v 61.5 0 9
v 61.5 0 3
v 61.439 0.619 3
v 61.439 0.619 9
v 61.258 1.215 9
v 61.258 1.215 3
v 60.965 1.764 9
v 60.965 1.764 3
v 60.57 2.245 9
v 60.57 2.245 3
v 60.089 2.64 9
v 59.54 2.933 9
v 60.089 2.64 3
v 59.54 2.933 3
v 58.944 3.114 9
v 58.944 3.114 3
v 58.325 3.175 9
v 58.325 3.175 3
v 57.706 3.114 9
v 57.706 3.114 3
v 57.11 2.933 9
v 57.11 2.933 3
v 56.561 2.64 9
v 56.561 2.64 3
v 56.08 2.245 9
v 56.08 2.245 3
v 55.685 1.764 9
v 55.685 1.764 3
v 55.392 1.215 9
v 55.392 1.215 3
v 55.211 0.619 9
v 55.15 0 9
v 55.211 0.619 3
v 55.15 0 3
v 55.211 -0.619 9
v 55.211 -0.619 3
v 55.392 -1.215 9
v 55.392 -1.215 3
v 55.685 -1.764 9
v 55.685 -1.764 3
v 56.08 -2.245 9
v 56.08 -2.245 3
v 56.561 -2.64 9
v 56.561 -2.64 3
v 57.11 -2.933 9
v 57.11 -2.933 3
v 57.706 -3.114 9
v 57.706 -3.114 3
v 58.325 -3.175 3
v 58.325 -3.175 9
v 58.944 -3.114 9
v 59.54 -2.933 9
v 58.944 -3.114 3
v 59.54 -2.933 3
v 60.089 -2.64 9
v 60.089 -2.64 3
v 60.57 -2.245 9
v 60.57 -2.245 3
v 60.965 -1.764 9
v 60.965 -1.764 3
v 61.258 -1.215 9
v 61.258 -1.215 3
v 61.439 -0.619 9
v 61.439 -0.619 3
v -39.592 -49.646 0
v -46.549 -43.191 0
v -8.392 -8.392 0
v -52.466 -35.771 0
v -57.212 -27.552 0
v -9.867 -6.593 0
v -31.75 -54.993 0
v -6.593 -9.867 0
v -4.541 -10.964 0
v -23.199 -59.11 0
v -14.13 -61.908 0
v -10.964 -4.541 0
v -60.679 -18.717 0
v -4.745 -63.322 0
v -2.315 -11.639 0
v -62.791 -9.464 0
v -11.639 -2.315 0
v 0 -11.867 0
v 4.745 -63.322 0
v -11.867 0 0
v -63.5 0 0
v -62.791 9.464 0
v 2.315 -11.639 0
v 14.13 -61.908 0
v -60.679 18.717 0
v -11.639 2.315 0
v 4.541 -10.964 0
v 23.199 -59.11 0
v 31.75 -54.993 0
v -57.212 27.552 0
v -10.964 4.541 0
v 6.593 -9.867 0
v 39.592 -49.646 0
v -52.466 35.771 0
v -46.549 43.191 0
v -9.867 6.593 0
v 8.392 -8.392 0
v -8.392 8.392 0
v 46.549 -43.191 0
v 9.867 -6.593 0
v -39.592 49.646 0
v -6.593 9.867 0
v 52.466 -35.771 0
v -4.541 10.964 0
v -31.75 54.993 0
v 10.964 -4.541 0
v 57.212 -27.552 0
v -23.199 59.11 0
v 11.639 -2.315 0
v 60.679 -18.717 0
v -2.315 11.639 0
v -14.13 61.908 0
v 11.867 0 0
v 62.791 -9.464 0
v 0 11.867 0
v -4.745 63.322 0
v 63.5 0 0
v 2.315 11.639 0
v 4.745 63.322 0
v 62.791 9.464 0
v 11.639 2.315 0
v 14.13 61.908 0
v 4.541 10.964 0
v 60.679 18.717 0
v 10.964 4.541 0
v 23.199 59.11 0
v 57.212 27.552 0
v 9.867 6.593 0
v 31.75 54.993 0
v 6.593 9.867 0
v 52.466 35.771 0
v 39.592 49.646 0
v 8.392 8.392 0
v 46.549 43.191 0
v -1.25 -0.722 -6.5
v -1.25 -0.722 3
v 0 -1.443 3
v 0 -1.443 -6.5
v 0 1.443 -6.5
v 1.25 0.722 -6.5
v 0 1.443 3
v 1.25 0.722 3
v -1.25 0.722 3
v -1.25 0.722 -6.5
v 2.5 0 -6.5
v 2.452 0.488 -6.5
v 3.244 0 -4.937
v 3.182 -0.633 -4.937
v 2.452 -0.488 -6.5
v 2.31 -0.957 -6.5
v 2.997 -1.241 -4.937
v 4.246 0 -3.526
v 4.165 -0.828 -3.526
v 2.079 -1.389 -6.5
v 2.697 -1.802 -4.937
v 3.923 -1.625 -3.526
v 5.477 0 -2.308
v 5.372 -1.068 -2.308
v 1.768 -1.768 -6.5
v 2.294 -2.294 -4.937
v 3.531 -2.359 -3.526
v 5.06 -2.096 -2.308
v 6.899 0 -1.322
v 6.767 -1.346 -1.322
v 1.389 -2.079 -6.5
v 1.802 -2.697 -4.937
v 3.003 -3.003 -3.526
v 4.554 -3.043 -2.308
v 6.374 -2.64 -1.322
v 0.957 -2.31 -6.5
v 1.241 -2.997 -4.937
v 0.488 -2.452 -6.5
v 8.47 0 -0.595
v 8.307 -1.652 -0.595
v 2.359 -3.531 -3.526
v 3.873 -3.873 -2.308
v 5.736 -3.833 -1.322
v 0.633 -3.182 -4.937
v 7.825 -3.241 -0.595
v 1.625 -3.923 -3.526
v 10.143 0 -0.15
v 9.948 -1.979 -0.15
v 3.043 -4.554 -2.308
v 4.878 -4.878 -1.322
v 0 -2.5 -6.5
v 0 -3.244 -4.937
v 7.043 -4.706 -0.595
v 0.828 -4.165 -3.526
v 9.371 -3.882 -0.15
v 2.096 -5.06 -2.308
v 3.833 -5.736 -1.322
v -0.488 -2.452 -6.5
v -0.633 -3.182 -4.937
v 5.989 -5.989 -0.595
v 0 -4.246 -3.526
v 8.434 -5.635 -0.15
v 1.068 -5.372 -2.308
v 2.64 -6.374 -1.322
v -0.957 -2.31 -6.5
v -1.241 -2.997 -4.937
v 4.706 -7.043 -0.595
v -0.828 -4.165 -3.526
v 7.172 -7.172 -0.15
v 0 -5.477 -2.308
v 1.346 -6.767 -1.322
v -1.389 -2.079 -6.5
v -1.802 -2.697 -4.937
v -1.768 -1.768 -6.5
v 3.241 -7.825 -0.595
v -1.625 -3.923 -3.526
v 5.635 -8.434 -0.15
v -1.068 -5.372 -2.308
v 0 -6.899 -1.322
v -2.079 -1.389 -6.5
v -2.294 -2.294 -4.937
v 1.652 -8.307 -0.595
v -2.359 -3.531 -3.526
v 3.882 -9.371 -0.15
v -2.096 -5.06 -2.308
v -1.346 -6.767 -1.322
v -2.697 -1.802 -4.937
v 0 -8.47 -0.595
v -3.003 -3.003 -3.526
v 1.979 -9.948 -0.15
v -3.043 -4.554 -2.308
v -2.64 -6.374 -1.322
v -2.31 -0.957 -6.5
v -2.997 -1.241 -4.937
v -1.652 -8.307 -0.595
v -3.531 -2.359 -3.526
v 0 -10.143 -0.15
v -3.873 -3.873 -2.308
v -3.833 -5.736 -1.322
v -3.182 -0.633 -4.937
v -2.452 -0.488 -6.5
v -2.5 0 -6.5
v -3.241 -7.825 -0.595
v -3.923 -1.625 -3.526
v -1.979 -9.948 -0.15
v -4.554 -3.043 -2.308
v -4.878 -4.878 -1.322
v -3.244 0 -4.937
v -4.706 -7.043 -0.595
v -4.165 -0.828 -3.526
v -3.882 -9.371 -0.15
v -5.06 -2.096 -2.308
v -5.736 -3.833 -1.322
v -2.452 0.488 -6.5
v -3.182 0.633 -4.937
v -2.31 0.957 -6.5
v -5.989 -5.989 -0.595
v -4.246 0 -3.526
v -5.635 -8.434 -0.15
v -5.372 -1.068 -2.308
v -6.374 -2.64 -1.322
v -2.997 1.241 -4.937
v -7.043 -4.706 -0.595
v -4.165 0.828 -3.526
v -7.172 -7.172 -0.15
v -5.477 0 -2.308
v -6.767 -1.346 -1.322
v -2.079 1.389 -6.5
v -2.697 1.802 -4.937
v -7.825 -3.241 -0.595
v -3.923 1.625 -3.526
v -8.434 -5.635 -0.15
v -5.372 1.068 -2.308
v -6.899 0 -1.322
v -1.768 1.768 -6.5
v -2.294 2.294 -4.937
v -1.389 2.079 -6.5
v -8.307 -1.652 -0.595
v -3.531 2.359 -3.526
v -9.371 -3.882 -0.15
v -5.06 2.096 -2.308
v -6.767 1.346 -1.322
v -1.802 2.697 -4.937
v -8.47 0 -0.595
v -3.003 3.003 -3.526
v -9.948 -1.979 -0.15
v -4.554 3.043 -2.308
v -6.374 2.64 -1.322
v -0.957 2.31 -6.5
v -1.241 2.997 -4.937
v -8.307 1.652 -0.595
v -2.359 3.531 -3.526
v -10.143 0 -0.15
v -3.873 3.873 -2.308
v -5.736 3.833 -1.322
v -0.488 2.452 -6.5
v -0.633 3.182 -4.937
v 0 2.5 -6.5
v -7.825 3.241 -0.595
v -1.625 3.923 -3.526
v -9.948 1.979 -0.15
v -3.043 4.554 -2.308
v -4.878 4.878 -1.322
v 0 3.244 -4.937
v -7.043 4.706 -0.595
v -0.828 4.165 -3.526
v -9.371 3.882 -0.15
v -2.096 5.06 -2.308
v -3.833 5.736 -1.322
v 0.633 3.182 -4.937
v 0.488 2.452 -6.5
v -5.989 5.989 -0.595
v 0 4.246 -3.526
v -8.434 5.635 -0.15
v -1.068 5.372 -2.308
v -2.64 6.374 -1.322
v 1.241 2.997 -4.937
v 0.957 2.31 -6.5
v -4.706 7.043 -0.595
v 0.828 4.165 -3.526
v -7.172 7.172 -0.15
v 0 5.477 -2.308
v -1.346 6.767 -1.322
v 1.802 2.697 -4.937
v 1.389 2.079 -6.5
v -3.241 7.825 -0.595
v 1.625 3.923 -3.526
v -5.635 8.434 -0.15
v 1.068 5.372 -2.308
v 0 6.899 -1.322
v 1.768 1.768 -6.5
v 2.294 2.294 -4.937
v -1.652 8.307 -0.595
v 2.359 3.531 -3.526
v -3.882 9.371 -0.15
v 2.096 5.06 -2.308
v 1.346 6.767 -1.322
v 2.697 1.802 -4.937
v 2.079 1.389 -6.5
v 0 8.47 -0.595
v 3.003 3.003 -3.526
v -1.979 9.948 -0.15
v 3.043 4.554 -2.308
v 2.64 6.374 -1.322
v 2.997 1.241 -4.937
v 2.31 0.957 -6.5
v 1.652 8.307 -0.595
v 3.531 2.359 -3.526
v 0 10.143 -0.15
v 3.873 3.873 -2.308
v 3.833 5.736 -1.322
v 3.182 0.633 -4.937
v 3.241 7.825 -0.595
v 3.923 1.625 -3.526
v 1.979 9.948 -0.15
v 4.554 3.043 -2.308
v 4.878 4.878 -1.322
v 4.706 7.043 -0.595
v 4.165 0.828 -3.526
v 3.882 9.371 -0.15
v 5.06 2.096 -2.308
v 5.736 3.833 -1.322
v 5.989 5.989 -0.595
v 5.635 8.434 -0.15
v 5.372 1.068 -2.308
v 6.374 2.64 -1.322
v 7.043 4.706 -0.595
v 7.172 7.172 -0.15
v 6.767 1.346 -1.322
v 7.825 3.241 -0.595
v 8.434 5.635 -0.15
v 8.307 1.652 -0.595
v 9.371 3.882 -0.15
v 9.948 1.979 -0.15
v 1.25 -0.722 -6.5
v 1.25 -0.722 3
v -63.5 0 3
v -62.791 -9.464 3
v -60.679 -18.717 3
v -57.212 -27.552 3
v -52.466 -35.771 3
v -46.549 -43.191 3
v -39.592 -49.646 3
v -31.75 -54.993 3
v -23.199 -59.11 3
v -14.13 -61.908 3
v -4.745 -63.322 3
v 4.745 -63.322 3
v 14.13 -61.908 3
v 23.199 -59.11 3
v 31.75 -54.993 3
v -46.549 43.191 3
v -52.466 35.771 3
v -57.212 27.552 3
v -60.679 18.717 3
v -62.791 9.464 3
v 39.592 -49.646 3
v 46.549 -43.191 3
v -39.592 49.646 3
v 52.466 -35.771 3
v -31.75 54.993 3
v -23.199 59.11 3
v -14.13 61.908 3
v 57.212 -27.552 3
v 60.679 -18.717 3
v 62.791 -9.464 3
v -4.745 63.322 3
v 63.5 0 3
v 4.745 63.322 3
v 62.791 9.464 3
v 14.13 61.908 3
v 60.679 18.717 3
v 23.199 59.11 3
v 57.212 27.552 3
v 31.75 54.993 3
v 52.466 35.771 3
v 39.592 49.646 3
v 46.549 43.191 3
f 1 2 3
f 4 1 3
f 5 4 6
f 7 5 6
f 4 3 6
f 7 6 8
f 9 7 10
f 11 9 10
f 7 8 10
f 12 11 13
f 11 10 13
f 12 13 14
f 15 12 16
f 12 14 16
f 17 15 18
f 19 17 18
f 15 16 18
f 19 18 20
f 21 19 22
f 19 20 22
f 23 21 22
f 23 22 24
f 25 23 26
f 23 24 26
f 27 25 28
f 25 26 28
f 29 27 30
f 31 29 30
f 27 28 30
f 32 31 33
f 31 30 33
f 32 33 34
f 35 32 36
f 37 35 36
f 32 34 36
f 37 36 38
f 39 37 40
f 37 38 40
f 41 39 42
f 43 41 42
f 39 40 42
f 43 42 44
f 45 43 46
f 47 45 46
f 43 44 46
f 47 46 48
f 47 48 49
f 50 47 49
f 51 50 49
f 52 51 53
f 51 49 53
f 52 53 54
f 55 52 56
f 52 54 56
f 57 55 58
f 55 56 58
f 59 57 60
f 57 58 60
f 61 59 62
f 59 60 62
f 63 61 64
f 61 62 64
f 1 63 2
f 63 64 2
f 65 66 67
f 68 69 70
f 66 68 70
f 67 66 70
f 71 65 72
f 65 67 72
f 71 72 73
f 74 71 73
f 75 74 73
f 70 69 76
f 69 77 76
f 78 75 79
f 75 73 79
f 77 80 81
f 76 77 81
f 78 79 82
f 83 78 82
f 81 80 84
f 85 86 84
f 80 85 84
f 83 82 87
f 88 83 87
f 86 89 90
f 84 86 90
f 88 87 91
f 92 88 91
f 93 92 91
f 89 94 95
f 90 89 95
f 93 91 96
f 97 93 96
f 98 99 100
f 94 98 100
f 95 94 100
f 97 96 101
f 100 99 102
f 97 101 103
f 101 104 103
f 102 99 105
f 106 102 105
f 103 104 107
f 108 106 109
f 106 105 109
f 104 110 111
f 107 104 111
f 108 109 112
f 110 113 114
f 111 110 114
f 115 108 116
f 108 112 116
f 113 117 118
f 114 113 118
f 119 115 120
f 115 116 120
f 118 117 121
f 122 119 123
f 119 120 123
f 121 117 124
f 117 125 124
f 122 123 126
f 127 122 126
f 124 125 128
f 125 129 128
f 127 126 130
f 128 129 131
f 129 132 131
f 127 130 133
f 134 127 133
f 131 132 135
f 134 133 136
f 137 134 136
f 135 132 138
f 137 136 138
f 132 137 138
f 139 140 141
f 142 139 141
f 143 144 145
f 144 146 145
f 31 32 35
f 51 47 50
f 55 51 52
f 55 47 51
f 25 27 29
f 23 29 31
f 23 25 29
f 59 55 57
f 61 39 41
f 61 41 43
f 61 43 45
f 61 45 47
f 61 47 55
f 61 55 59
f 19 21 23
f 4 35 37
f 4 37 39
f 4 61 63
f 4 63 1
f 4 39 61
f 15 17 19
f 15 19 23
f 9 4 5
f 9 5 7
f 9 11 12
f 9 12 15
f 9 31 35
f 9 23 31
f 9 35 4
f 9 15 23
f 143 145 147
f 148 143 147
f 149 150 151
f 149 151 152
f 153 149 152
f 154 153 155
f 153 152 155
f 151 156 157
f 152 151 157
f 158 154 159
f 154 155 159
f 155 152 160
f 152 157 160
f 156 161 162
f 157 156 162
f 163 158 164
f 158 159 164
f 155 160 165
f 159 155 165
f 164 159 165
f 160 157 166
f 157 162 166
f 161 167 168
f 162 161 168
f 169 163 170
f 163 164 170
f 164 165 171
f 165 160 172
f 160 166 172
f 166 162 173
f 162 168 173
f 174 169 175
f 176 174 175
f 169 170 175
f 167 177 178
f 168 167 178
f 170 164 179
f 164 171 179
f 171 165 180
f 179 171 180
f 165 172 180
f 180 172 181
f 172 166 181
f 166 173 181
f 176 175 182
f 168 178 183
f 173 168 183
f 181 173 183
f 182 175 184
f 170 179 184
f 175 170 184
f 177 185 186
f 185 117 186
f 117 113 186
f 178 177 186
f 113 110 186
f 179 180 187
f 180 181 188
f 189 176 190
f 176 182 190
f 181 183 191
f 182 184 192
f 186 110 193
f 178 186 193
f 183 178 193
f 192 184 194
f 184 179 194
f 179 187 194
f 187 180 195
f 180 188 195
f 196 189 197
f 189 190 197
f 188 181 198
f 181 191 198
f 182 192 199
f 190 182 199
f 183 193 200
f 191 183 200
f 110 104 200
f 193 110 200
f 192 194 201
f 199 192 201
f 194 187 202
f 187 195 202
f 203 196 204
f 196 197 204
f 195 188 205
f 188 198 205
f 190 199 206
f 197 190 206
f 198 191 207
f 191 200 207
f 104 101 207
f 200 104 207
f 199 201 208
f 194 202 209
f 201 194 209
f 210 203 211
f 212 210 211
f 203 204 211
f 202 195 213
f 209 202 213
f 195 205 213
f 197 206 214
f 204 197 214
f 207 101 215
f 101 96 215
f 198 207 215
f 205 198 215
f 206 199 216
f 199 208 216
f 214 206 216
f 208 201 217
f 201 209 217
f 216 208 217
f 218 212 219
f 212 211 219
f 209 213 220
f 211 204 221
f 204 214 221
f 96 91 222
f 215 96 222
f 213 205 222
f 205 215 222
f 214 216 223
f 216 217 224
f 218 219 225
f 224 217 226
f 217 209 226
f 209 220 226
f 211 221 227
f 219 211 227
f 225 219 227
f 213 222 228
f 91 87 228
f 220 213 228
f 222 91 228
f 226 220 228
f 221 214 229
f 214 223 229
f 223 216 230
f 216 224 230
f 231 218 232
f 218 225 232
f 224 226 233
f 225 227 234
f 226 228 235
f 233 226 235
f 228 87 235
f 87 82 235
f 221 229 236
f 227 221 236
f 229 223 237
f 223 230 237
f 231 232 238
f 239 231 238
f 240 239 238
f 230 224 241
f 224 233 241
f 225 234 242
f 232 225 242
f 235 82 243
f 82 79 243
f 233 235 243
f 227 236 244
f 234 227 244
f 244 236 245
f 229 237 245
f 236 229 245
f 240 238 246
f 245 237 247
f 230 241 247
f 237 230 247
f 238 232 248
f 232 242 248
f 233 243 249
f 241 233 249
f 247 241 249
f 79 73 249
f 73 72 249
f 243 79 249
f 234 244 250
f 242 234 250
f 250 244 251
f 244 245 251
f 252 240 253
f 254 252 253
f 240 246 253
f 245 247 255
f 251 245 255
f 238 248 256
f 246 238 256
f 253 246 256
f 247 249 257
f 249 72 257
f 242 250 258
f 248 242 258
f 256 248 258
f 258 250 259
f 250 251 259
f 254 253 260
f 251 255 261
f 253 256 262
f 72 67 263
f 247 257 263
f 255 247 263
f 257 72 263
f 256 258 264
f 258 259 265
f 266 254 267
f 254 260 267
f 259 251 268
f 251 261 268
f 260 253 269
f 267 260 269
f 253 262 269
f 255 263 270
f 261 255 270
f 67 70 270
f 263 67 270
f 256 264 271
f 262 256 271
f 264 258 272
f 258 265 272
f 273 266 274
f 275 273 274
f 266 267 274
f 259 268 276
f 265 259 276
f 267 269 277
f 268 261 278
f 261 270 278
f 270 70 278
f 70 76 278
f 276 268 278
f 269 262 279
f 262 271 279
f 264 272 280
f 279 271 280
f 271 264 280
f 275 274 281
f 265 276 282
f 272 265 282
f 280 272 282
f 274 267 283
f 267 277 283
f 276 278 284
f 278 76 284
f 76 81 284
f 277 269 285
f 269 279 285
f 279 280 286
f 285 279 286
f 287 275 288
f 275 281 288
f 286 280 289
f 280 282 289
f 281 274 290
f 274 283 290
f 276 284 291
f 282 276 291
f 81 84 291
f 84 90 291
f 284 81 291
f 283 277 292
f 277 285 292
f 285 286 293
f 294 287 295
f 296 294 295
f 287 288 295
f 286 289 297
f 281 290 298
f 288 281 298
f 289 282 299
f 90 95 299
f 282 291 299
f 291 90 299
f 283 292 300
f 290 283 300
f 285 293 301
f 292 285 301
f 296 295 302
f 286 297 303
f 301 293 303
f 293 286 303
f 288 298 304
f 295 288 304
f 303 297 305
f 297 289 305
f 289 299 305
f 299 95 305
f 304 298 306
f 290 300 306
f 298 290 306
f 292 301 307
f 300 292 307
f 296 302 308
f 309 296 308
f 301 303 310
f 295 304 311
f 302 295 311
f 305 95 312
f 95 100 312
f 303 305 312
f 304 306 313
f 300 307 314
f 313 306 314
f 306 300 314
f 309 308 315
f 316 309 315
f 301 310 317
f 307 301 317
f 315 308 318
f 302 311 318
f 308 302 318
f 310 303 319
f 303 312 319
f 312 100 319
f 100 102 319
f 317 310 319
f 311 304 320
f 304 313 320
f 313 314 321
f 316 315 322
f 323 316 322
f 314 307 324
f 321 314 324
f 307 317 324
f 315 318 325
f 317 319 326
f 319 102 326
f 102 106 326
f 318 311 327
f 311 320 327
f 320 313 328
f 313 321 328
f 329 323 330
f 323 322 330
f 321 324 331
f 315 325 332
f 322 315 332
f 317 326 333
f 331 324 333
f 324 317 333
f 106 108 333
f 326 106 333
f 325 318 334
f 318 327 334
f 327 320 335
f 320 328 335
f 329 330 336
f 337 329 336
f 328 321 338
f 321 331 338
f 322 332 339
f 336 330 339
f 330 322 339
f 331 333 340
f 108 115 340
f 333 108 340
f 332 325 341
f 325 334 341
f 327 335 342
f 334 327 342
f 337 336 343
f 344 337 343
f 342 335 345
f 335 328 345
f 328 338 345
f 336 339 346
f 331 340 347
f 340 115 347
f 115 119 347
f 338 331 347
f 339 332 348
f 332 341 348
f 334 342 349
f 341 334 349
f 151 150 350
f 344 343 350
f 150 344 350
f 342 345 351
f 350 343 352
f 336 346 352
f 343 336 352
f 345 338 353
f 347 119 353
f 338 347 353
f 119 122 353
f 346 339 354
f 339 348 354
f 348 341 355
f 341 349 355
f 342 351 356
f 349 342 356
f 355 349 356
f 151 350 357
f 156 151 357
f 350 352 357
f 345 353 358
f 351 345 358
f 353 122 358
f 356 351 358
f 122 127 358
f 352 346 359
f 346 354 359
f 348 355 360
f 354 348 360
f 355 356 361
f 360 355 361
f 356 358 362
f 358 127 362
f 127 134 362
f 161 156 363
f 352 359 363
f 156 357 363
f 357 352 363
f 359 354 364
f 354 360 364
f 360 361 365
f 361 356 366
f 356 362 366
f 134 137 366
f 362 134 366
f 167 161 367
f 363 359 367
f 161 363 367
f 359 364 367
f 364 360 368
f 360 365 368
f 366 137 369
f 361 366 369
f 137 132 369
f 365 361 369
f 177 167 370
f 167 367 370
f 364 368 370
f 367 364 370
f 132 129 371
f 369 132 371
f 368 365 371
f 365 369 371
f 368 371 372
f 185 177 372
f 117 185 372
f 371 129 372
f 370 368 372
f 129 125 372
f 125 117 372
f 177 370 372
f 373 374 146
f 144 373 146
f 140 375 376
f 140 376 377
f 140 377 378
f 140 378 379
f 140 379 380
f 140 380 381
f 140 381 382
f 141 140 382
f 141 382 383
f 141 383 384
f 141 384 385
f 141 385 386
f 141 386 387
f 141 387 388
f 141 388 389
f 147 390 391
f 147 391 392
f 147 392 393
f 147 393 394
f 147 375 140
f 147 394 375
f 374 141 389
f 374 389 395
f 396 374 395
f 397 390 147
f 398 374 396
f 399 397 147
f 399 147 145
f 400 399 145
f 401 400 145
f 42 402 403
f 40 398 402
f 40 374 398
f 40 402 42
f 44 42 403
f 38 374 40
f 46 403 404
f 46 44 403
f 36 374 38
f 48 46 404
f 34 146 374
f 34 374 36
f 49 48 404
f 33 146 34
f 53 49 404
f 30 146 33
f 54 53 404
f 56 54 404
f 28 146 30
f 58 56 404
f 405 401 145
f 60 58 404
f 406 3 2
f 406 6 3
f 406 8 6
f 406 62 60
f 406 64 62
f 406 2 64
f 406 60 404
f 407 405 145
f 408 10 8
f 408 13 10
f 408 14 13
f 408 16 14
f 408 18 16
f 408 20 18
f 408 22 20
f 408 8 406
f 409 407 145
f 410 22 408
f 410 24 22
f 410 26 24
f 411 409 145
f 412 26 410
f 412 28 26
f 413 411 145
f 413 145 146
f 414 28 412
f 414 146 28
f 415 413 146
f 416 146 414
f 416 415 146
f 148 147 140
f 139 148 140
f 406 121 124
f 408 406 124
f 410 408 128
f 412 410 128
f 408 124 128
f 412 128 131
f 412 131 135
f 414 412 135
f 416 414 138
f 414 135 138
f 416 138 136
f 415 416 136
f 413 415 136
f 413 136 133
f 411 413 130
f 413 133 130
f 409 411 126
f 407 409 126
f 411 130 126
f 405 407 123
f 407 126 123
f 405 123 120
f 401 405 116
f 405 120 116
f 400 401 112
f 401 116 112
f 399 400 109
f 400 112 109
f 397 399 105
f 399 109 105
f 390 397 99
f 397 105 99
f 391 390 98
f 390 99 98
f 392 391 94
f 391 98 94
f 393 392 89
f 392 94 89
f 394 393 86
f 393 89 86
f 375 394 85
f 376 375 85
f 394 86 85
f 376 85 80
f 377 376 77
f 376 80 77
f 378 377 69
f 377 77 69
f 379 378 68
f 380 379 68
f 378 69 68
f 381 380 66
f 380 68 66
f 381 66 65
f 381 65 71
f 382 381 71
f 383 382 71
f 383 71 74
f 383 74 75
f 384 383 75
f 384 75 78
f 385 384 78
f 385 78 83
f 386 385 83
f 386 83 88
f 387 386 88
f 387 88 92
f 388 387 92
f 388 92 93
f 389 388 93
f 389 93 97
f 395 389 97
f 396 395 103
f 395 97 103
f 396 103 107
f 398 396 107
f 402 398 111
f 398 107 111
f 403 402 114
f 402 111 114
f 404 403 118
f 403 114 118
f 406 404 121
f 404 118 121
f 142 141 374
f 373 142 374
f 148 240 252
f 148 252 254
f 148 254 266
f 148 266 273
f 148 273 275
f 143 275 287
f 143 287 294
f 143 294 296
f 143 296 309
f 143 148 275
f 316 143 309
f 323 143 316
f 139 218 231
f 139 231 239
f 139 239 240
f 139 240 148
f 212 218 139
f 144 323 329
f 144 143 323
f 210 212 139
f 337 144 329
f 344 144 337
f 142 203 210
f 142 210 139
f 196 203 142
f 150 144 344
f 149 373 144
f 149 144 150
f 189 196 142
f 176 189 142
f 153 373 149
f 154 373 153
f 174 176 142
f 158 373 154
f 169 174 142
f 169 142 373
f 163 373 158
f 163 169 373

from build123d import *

# Parameters (mm, degrees)
SKETCH1_R           = 63.5
BOSS_EXTRUDE1_DEPTH = 3
SKETCH3_R           = 3.175
BOSS_EXTRUDE2_DEPTH = 6
CUT_EXTRUDE1_DEPTH  = 6
SKETCH5_R           = 2.5
BOSS_EXTRUDE3_DEPTH = 6.5
FILLET1_R           = 10


with BuildPart() as part:
    # Sketch1 → Boss-Extrude1 (new body)
    with BuildSketch(Plane.XY):
        Circle(SKETCH1_R)
    extrude(amount=BOSS_EXTRUDE1_DEPTH)

    # Sketch3 → Boss-Extrude2 (add)
    with BuildSketch(Plane.XY.offset(3)):
        with Locations((58.325, 0)):
            Circle(SKETCH3_R)
    extrude(amount=BOSS_EXTRUDE2_DEPTH)

    # Sketch4 → Cut-Extrude1 (cut)
    with BuildSketch(Plane.XY.offset(3)):
        Polygon((0, 1.443375673), (-1.25, 0.721687836), (-1.25, -0.721687836), (0, -1.443375673), (1.25, -0.721687836), (1.25, 0.721687836), align=None)
    extrude(amount=-CUT_EXTRUDE1_DEPTH, mode=Mode.SUBTRACT)

    # Sketch5 → Boss-Extrude3 (add)
    with BuildSketch(Plane(origin=(0, 0, 0), x_dir=(-1, 0, 0), z_dir=(0, 0, -1))):
        with Locations(Location((0, 0, 0), (0, 0, 180))):
            Circle(SKETCH5_R)
        Polygon((-1.25, 0.721687836), (0, 1.443375673), (1.25, 0.721687836), (1.25, -0.721687836), (0, -1.443375673), (-1.25, -0.721687836), align=None, mode=Mode.SUBTRACT)
    extrude(amount=BOSS_EXTRUDE3_DEPTH)

    # Fillet1
    # the kernel refuses this fillet: 10 mm, written as the material it adds along each edge
    with BuildSketch(Plane(origin=(0, 0, 0), x_dir=(1, 0, 0), z_dir=(0, 1, 0))) as fillet1_piece_1:
        with BuildLine():
            CenterArc((11.867496998, 10), FILLET1_R, 200.487315115, 69.512684885)
            Line((11.867496998, 0), (11.867496998, -0.2))
            Line((11.867496998, -0.2), (2.5, -0.2))
            Line((2.5, -0.2), (2.3, 0))
            ThreePointArc((2.3, 0), (2.3, 3.25), (2.31265006, 6.43))
            Line((2.31265006, 6.43), (2.5, 6.5))
        make_face()
    revolve(axis=Axis((0, 0, 0), (0, 0, -1)))


solid = part.part
